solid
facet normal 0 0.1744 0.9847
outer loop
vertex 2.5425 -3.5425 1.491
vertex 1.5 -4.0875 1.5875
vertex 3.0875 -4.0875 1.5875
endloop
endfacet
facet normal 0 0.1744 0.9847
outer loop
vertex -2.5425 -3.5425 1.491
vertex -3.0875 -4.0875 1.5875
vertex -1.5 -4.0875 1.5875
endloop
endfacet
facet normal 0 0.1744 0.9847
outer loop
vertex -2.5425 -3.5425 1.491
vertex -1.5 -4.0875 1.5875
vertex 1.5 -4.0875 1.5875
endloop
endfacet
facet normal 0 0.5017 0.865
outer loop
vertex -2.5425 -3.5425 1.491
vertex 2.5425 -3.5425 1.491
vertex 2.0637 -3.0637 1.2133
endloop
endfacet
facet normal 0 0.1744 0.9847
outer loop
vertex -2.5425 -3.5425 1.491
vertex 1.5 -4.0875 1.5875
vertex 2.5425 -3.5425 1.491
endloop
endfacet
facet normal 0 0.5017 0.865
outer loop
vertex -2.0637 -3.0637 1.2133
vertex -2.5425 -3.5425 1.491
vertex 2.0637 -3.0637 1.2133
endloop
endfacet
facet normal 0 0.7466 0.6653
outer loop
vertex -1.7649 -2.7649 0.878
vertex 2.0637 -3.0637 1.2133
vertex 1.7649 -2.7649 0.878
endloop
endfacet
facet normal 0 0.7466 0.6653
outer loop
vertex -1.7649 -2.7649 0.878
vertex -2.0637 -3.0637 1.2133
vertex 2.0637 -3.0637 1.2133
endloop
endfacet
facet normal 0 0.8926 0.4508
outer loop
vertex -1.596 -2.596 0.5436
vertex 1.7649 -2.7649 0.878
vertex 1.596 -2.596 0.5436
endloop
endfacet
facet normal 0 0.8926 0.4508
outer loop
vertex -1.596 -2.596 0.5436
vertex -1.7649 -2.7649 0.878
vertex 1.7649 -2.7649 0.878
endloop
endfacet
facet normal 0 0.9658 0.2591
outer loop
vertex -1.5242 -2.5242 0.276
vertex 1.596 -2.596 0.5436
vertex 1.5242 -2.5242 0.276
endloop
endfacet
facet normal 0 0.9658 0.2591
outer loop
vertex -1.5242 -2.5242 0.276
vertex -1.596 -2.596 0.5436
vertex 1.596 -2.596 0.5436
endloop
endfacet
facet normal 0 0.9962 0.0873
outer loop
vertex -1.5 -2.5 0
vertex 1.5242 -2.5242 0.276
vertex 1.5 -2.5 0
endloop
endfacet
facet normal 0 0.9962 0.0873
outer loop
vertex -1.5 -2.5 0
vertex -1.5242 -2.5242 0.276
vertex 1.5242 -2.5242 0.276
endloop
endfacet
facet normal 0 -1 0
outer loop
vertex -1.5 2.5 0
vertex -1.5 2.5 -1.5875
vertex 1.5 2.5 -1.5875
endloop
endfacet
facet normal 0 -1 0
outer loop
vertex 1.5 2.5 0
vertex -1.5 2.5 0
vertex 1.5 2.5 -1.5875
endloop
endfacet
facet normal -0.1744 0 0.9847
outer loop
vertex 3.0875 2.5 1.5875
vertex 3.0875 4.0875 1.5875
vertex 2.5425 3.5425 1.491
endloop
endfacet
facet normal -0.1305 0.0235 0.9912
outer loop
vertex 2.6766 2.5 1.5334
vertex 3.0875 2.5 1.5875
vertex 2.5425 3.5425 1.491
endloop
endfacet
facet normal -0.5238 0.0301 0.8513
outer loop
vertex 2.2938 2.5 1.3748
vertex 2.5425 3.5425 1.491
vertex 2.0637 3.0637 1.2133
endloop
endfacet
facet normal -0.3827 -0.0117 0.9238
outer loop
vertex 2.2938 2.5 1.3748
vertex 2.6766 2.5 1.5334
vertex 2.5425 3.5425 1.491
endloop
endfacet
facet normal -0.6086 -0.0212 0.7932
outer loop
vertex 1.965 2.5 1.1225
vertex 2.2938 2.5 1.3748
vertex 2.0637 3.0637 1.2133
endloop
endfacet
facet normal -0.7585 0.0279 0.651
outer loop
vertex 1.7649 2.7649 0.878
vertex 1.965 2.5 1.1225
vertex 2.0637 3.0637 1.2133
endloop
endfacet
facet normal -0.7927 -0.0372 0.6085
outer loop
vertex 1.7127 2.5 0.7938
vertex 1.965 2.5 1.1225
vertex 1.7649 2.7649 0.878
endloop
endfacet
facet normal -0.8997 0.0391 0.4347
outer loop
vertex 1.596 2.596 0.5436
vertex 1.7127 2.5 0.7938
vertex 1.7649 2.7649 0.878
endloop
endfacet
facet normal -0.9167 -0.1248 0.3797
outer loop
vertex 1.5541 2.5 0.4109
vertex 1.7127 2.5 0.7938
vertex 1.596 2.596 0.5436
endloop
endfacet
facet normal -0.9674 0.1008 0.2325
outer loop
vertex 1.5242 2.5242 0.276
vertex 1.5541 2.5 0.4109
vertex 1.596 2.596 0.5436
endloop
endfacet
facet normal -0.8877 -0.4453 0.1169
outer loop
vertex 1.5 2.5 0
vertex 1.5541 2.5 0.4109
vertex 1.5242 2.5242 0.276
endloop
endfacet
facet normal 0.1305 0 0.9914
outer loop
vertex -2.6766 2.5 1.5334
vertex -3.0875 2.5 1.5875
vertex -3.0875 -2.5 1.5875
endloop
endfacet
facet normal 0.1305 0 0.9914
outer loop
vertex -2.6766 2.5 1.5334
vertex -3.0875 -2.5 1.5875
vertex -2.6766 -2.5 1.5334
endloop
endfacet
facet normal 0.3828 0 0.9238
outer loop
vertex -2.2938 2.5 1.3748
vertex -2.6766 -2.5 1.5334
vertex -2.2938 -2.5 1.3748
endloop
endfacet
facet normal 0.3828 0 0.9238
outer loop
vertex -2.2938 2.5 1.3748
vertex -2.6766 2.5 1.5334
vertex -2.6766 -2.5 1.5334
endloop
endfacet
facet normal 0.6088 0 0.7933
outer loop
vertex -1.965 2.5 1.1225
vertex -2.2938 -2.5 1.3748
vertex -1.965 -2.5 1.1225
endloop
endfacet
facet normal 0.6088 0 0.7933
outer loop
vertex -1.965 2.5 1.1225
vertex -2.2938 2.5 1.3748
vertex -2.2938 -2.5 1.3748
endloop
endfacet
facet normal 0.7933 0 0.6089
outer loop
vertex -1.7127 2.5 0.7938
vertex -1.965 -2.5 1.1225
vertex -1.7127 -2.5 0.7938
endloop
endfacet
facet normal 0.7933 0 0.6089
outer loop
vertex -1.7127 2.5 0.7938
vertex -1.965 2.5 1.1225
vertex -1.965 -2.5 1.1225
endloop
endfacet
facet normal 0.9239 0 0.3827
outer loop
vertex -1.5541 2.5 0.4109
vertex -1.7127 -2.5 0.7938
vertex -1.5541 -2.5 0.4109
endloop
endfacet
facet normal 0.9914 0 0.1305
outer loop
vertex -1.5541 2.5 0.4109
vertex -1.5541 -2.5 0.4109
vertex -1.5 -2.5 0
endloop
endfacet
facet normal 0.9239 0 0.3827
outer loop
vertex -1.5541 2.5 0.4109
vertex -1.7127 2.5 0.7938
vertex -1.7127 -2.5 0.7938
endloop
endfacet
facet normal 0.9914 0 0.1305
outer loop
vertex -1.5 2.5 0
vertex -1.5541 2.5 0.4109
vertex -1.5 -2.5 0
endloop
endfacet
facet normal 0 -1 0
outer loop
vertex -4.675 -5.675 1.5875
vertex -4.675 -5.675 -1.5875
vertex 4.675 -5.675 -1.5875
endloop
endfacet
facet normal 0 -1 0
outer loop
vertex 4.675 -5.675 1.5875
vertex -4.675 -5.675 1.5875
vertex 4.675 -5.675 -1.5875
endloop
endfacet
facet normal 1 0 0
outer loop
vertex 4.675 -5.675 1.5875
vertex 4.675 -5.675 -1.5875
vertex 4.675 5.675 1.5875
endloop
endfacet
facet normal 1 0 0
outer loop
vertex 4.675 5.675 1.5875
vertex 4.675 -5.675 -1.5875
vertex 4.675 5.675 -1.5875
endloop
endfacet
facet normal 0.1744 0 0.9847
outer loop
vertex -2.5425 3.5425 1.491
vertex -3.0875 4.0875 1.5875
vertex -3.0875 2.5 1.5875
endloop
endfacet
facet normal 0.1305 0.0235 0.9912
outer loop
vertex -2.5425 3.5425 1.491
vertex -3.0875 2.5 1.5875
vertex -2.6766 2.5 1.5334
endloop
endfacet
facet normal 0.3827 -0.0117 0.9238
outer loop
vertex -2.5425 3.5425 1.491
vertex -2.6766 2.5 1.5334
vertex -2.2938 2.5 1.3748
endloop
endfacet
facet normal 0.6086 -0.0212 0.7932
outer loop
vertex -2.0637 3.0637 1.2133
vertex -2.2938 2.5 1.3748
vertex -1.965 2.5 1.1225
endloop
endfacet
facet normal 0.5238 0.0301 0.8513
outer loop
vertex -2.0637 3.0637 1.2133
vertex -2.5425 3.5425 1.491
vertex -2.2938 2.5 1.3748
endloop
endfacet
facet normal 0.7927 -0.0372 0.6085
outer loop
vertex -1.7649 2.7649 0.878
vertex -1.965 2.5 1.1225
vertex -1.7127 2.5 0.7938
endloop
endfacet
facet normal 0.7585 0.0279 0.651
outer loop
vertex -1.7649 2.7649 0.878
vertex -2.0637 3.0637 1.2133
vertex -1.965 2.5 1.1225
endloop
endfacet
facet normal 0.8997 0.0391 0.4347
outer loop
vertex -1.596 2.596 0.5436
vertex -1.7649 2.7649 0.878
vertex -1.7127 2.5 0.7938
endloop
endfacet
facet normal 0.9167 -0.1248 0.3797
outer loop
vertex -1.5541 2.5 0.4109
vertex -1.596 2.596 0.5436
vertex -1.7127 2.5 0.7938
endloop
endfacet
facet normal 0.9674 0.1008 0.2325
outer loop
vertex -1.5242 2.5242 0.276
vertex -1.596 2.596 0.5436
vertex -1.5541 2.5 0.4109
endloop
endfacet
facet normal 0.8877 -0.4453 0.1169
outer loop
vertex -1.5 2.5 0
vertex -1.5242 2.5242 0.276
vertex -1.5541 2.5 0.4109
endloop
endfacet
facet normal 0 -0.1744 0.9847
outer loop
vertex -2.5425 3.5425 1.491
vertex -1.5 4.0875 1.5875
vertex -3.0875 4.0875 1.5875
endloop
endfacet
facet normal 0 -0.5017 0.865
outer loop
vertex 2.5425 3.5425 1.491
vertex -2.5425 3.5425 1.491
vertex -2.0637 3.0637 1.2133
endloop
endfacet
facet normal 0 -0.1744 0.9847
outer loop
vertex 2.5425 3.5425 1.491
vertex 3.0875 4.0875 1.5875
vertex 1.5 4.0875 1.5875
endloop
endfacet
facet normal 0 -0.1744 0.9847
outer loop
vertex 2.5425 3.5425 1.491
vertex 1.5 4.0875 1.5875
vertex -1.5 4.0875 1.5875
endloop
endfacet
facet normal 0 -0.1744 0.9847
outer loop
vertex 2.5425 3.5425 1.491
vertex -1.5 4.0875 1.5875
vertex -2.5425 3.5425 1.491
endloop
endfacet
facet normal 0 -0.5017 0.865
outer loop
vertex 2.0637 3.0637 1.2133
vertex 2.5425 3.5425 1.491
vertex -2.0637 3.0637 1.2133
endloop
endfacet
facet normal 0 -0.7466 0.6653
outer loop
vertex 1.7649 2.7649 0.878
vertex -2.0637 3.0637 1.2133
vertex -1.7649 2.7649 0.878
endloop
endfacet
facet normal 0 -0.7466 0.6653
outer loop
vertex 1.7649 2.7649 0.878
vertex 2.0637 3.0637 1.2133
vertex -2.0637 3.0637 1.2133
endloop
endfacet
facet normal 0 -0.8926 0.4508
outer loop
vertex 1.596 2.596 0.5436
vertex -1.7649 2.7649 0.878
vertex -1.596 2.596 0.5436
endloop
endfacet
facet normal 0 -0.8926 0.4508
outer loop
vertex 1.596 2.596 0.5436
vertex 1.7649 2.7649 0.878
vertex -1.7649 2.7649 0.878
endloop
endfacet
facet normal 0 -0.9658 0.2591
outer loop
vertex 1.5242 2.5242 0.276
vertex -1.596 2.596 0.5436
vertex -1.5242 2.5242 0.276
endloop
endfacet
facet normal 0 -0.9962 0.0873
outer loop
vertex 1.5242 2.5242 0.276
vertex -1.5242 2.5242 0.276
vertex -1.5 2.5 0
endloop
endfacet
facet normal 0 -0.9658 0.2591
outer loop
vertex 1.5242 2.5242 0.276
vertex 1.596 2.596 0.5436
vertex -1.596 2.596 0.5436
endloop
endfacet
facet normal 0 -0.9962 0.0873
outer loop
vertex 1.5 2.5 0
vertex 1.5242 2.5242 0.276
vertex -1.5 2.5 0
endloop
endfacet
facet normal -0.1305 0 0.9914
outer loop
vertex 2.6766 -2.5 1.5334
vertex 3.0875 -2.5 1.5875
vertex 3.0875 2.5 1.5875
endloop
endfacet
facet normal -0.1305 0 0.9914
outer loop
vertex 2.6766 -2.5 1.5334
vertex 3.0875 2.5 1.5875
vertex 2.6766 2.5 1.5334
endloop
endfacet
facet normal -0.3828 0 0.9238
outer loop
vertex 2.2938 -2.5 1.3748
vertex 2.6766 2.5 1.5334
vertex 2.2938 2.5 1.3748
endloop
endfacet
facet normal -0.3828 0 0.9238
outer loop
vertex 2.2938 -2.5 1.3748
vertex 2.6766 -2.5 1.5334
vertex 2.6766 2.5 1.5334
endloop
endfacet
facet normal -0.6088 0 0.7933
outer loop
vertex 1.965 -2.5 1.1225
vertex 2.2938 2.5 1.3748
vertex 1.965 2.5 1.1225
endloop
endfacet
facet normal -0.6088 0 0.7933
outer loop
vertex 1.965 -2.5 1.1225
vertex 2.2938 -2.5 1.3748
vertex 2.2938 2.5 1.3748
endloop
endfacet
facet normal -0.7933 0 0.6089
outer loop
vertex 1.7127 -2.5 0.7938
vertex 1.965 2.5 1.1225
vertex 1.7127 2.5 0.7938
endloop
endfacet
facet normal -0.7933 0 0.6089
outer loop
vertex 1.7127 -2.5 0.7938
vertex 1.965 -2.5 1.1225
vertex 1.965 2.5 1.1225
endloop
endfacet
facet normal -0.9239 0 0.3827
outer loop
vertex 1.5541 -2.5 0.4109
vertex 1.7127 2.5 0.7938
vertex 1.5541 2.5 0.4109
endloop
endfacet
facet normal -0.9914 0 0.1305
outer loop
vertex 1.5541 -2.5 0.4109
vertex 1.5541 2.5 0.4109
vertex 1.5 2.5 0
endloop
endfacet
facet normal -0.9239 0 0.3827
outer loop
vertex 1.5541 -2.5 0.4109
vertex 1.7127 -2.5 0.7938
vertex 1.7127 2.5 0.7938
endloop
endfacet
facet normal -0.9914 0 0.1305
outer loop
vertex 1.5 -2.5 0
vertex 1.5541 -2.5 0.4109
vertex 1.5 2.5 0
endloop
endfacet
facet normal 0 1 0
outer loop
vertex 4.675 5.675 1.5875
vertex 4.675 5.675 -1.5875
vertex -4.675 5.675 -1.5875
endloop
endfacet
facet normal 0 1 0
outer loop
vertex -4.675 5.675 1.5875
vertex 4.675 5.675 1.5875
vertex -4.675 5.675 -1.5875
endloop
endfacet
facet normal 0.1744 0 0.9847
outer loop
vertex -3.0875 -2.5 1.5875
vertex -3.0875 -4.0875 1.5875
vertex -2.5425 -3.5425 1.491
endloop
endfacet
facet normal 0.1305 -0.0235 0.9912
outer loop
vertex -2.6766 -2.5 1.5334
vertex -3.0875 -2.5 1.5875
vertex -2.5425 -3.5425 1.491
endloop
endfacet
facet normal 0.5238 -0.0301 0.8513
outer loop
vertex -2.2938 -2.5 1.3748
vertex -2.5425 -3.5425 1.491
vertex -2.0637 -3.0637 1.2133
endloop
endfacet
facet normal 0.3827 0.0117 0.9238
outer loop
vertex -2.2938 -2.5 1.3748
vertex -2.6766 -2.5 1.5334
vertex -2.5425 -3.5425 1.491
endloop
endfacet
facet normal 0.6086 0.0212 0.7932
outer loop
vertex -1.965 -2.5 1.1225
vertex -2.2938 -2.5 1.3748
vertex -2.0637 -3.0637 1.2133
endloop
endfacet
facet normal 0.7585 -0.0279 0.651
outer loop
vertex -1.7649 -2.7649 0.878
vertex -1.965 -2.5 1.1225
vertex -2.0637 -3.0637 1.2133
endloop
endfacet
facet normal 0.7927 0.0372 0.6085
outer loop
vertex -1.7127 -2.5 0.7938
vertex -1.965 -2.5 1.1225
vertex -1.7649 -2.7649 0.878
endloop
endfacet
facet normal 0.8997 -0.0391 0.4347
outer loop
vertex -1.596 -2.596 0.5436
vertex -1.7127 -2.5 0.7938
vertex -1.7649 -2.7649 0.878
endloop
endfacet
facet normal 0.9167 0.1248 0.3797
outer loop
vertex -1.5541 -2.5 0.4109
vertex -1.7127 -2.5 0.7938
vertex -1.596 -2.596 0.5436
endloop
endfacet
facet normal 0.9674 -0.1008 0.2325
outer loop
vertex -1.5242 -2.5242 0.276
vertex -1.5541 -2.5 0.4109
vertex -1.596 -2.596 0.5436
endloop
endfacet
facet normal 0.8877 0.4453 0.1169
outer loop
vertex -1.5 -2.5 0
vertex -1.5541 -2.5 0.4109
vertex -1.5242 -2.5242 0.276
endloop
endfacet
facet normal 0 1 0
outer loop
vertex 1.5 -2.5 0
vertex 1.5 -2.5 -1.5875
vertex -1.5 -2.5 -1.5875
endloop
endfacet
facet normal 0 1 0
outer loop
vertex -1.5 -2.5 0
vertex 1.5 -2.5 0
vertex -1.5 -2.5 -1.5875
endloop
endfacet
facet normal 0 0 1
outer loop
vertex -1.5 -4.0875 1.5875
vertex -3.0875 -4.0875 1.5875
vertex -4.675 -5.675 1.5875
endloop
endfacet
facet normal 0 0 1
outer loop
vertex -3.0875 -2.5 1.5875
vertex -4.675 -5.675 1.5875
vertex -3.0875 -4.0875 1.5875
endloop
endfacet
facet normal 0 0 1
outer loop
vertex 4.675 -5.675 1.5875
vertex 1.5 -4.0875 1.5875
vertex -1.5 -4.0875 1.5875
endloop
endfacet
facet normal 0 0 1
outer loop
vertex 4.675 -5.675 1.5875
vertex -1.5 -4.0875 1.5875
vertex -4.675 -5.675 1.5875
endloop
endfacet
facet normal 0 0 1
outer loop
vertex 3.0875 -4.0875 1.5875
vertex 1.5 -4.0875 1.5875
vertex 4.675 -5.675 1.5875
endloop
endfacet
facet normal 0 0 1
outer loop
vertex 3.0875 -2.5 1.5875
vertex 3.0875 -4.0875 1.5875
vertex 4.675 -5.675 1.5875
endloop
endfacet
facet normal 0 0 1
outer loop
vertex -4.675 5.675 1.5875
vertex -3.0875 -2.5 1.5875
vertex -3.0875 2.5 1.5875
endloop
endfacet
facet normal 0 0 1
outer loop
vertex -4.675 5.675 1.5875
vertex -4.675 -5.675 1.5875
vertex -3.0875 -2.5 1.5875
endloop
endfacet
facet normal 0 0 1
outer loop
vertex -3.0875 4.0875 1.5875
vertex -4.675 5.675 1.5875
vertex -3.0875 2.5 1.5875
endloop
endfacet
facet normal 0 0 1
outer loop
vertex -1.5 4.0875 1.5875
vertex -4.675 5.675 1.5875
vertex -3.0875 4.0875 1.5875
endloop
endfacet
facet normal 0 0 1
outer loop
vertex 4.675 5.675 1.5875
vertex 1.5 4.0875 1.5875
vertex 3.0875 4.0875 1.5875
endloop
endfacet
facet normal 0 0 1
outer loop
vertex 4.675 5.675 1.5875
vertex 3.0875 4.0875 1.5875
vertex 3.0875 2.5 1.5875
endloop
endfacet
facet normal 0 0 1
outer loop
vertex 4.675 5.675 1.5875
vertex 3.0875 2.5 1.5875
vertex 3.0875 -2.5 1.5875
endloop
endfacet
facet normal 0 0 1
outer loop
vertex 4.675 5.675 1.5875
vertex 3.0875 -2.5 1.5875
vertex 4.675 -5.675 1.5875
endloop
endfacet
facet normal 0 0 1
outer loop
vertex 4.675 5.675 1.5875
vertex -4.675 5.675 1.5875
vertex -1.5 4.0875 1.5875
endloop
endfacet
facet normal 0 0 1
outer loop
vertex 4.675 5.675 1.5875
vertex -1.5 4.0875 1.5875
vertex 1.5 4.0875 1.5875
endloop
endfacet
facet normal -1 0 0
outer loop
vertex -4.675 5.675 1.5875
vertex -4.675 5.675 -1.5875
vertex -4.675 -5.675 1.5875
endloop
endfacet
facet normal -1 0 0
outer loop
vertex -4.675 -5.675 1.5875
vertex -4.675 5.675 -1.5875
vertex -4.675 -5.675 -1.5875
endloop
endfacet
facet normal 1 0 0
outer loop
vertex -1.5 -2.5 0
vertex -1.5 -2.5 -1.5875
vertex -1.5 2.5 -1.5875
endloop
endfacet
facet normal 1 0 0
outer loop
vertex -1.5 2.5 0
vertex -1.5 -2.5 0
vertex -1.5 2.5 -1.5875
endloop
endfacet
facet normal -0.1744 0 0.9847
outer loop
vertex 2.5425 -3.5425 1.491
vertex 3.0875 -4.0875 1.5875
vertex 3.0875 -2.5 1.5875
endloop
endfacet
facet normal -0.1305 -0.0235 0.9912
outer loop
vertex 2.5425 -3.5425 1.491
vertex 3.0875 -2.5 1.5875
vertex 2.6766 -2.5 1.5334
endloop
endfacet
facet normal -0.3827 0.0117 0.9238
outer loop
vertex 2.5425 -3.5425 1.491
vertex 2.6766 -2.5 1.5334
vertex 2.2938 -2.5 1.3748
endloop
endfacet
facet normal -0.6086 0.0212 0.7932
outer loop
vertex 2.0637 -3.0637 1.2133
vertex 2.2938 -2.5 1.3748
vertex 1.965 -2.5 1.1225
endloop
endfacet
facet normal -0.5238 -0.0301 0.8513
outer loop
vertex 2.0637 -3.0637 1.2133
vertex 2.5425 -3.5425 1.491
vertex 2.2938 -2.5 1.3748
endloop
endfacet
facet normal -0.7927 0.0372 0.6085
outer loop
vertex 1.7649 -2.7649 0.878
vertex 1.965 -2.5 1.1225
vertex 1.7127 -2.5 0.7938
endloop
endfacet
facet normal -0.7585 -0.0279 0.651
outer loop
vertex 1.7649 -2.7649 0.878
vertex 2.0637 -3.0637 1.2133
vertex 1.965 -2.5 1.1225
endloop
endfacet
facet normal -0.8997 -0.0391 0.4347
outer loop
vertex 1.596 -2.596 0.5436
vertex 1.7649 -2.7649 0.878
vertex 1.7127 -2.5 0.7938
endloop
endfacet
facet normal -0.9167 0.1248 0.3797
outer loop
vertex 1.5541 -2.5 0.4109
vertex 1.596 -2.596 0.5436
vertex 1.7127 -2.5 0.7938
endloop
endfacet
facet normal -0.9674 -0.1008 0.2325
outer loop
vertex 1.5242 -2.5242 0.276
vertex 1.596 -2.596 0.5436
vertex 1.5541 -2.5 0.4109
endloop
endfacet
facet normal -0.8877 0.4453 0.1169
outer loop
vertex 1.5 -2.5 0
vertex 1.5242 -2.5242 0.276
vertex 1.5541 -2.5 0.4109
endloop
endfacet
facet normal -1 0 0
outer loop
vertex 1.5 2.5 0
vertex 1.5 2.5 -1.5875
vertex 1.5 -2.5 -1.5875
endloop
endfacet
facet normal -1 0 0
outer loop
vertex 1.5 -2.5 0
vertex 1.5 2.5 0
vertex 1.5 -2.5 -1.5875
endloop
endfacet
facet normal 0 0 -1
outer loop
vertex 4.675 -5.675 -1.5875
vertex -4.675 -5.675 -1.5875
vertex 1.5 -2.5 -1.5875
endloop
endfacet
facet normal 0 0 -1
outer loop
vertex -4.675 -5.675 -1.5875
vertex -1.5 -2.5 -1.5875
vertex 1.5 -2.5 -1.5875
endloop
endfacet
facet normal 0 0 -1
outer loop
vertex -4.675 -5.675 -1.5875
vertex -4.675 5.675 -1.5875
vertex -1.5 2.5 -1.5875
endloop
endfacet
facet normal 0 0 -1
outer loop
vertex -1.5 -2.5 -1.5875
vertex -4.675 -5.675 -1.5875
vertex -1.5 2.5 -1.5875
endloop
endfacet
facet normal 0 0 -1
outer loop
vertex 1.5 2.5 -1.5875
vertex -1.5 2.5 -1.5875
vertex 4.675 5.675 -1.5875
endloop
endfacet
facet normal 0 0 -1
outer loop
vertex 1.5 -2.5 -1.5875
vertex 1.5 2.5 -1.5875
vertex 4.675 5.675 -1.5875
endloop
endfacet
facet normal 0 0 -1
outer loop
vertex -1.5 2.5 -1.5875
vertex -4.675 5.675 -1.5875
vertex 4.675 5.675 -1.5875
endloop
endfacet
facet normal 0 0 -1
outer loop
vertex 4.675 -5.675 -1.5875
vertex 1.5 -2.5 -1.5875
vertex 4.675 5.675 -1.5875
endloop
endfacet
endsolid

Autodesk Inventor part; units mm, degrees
ref_plane "YZ Plane" through (0, 0, 0) normal (1, 0, 0) x (0, 1, 0)
ref_plane "XZ Plane" through (0, 0, 0) normal (0, 1, 0) x (-1, 0, 0)
ref_plane "XY Plane" through (0, 0, 0) normal (0, 0, 1) x (1, 0, 0)
sketch "Sketch1" plane through (0, 0, 0) normal (0, 0, 1) x (1, 0, 0)
  line L0 (-1.5, 2.5) -> (1.5, 2.5)
  line L1 (1.5, 2.5) -> (1.5, -2.5)
  line L2 (1.5, -2.5) -> (-1.5, -2.5)
  line L3 (-1.5, -2.5) -> (-1.5, 2.5)
  line L4 (-1.5, 2.5) -> (1.5, -2.5) construction
  line L5 (1.5, 2.5) -> (-1.5, -2.5) construction
  line L6 (4.675, 5.675) -> (-4.675, 5.675)
  line L7 (-4.675, 5.675) -> (-4.675, -5.675)
  line L8 (-4.675, -5.675) -> (4.675, -5.675)
  line L9 (4.675, -5.675) -> (4.675, 5.675)
  point P0 (0, 0)
  dimension "d0" = 3
  dimension "d1" = 5
  dimension "d2" = 3.175
extrude "Extrusion1" add sketch "Sketch1" along normal mid plane 3.175
fillet "Fillet1" radius 1.5875 2 edges at (0, 2.5, 1.5875) (0, -2.5, 1.5875)
fillet "Fillet2" radius 1.5875 2 edges at (-1.5, 0, 1.5875) (1.5, 0, 1.5875)
properties part number "Motor Fitting Test 2"
